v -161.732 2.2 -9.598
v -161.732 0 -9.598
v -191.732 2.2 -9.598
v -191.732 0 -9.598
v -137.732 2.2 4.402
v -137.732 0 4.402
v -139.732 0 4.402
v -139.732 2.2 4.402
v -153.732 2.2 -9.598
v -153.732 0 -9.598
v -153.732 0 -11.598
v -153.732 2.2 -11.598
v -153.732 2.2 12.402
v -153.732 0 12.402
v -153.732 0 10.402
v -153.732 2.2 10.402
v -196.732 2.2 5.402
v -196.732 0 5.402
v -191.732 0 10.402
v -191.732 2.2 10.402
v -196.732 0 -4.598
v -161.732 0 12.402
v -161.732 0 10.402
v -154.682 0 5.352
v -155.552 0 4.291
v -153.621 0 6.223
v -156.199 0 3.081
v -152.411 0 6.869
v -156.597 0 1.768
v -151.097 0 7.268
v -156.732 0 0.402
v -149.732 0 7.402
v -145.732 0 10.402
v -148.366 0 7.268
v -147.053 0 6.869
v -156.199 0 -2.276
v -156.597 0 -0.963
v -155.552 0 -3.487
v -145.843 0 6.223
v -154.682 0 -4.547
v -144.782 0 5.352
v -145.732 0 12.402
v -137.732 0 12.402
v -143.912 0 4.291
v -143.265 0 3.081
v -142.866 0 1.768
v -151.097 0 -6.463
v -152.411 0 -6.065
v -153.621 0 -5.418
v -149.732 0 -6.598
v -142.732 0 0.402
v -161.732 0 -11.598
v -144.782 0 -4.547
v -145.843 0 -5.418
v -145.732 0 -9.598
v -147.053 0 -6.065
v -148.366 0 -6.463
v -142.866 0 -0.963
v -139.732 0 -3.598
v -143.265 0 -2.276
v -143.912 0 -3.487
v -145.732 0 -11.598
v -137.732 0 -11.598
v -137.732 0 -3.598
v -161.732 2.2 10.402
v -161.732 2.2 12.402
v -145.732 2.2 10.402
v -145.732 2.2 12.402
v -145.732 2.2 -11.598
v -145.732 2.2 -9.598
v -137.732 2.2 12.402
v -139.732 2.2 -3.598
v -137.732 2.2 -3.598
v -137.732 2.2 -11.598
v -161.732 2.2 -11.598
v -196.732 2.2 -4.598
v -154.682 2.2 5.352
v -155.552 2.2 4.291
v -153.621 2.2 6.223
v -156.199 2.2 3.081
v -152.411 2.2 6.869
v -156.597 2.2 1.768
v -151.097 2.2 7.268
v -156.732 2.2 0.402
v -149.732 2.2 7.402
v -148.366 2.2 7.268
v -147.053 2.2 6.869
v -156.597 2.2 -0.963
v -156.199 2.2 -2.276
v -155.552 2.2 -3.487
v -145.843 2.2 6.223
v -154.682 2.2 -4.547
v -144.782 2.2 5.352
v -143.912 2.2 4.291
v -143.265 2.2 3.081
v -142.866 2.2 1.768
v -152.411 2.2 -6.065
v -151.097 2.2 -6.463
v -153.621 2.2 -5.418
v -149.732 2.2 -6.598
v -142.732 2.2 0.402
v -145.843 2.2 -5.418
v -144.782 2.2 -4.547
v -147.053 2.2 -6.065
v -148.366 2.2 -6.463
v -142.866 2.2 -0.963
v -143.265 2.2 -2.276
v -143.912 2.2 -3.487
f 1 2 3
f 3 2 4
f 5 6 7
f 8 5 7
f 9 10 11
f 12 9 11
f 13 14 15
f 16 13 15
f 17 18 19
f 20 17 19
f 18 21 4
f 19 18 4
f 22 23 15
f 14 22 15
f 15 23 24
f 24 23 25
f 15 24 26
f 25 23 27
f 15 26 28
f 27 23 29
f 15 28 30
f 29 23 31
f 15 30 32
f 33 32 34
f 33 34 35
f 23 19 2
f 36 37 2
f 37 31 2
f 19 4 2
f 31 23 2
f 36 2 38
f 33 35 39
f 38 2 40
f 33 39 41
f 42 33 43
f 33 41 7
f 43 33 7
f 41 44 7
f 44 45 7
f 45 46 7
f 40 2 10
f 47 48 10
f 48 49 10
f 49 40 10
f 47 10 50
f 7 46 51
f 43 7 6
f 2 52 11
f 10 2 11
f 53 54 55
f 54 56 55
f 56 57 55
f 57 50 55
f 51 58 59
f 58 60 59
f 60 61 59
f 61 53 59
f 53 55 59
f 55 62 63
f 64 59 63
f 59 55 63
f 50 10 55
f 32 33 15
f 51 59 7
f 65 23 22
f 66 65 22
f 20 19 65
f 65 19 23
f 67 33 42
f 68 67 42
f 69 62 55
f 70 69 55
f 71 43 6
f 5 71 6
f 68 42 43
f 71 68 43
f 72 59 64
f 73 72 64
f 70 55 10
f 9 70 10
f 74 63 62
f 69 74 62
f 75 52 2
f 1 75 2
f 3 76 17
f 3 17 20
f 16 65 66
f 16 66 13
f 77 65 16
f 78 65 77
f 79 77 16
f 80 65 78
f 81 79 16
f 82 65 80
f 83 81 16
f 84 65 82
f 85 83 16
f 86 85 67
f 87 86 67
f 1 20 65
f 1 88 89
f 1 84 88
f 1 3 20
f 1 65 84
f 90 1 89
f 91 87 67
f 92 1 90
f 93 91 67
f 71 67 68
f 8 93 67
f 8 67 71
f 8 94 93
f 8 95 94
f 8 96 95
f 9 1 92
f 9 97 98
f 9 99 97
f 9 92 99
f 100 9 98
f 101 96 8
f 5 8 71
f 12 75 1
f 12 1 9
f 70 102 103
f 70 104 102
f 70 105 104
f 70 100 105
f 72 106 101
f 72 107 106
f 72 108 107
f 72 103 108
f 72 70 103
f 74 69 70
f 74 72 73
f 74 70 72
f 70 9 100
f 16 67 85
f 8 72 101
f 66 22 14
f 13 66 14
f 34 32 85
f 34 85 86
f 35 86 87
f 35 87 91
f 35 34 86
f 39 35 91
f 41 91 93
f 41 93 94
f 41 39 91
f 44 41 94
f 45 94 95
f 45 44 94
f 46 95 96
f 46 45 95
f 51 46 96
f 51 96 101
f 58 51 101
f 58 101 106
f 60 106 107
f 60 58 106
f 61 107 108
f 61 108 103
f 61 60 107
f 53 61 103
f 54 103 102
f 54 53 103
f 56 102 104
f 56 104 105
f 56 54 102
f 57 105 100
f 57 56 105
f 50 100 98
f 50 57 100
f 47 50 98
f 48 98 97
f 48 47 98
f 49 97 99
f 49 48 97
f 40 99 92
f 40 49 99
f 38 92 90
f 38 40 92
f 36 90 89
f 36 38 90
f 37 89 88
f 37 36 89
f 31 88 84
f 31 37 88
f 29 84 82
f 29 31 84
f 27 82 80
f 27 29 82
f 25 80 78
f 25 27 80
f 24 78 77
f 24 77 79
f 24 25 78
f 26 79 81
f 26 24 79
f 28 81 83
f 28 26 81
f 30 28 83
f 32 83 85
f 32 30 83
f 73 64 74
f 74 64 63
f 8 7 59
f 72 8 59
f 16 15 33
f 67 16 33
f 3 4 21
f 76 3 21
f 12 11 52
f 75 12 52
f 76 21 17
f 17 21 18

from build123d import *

# Parameters (mm, degrees)
SKETCH1_R           = 7
BOSS_EXTRUDE1_DEPTH = 2.2


with BuildPart() as part:
    # Sketch1 → Boss-Extrude1 (new body)
    with BuildSketch(Plane(origin=(0, 0, 0), x_dir=(1, 0, 0), z_dir=(0, 1, 0))):
        Polygon((-137.731808477, 3.597712716), (-137.731808477, 11.597712716), (-145.731808477, 11.597712716), (-145.731808477, 9.597712716), (-153.731808477, 9.597712716), (-153.731808477, 11.597712716), (-161.731808477, 11.597712716), (-161.731808477, 9.597712716), (-191.731808477, 9.597712716), (-196.731808477, 4.597712716), (-196.731808477, -5.402287284), (-191.731808477, -10.402287284), (-161.731808477, -10.402287284), (-161.731808477, -12.402287284), (-153.731808477, -12.402287284), (-153.731808477, -10.402287284), (-145.731808477, -10.402287284), (-145.731808477, -12.402287284), (-137.731808477, -12.402287284), (-137.731808477, -4.402287284), (-139.731808477, -4.402287284), (-139.731808477, 3.597712716), align=None)
        with Locations(Location((-149.731808477, -0.402287284, 0), (0, 0, 270))):
            Circle(SKETCH1_R, mode=Mode.SUBTRACT)
    extrude(amount=BOSS_EXTRUDE1_DEPTH)


solid = part.part
